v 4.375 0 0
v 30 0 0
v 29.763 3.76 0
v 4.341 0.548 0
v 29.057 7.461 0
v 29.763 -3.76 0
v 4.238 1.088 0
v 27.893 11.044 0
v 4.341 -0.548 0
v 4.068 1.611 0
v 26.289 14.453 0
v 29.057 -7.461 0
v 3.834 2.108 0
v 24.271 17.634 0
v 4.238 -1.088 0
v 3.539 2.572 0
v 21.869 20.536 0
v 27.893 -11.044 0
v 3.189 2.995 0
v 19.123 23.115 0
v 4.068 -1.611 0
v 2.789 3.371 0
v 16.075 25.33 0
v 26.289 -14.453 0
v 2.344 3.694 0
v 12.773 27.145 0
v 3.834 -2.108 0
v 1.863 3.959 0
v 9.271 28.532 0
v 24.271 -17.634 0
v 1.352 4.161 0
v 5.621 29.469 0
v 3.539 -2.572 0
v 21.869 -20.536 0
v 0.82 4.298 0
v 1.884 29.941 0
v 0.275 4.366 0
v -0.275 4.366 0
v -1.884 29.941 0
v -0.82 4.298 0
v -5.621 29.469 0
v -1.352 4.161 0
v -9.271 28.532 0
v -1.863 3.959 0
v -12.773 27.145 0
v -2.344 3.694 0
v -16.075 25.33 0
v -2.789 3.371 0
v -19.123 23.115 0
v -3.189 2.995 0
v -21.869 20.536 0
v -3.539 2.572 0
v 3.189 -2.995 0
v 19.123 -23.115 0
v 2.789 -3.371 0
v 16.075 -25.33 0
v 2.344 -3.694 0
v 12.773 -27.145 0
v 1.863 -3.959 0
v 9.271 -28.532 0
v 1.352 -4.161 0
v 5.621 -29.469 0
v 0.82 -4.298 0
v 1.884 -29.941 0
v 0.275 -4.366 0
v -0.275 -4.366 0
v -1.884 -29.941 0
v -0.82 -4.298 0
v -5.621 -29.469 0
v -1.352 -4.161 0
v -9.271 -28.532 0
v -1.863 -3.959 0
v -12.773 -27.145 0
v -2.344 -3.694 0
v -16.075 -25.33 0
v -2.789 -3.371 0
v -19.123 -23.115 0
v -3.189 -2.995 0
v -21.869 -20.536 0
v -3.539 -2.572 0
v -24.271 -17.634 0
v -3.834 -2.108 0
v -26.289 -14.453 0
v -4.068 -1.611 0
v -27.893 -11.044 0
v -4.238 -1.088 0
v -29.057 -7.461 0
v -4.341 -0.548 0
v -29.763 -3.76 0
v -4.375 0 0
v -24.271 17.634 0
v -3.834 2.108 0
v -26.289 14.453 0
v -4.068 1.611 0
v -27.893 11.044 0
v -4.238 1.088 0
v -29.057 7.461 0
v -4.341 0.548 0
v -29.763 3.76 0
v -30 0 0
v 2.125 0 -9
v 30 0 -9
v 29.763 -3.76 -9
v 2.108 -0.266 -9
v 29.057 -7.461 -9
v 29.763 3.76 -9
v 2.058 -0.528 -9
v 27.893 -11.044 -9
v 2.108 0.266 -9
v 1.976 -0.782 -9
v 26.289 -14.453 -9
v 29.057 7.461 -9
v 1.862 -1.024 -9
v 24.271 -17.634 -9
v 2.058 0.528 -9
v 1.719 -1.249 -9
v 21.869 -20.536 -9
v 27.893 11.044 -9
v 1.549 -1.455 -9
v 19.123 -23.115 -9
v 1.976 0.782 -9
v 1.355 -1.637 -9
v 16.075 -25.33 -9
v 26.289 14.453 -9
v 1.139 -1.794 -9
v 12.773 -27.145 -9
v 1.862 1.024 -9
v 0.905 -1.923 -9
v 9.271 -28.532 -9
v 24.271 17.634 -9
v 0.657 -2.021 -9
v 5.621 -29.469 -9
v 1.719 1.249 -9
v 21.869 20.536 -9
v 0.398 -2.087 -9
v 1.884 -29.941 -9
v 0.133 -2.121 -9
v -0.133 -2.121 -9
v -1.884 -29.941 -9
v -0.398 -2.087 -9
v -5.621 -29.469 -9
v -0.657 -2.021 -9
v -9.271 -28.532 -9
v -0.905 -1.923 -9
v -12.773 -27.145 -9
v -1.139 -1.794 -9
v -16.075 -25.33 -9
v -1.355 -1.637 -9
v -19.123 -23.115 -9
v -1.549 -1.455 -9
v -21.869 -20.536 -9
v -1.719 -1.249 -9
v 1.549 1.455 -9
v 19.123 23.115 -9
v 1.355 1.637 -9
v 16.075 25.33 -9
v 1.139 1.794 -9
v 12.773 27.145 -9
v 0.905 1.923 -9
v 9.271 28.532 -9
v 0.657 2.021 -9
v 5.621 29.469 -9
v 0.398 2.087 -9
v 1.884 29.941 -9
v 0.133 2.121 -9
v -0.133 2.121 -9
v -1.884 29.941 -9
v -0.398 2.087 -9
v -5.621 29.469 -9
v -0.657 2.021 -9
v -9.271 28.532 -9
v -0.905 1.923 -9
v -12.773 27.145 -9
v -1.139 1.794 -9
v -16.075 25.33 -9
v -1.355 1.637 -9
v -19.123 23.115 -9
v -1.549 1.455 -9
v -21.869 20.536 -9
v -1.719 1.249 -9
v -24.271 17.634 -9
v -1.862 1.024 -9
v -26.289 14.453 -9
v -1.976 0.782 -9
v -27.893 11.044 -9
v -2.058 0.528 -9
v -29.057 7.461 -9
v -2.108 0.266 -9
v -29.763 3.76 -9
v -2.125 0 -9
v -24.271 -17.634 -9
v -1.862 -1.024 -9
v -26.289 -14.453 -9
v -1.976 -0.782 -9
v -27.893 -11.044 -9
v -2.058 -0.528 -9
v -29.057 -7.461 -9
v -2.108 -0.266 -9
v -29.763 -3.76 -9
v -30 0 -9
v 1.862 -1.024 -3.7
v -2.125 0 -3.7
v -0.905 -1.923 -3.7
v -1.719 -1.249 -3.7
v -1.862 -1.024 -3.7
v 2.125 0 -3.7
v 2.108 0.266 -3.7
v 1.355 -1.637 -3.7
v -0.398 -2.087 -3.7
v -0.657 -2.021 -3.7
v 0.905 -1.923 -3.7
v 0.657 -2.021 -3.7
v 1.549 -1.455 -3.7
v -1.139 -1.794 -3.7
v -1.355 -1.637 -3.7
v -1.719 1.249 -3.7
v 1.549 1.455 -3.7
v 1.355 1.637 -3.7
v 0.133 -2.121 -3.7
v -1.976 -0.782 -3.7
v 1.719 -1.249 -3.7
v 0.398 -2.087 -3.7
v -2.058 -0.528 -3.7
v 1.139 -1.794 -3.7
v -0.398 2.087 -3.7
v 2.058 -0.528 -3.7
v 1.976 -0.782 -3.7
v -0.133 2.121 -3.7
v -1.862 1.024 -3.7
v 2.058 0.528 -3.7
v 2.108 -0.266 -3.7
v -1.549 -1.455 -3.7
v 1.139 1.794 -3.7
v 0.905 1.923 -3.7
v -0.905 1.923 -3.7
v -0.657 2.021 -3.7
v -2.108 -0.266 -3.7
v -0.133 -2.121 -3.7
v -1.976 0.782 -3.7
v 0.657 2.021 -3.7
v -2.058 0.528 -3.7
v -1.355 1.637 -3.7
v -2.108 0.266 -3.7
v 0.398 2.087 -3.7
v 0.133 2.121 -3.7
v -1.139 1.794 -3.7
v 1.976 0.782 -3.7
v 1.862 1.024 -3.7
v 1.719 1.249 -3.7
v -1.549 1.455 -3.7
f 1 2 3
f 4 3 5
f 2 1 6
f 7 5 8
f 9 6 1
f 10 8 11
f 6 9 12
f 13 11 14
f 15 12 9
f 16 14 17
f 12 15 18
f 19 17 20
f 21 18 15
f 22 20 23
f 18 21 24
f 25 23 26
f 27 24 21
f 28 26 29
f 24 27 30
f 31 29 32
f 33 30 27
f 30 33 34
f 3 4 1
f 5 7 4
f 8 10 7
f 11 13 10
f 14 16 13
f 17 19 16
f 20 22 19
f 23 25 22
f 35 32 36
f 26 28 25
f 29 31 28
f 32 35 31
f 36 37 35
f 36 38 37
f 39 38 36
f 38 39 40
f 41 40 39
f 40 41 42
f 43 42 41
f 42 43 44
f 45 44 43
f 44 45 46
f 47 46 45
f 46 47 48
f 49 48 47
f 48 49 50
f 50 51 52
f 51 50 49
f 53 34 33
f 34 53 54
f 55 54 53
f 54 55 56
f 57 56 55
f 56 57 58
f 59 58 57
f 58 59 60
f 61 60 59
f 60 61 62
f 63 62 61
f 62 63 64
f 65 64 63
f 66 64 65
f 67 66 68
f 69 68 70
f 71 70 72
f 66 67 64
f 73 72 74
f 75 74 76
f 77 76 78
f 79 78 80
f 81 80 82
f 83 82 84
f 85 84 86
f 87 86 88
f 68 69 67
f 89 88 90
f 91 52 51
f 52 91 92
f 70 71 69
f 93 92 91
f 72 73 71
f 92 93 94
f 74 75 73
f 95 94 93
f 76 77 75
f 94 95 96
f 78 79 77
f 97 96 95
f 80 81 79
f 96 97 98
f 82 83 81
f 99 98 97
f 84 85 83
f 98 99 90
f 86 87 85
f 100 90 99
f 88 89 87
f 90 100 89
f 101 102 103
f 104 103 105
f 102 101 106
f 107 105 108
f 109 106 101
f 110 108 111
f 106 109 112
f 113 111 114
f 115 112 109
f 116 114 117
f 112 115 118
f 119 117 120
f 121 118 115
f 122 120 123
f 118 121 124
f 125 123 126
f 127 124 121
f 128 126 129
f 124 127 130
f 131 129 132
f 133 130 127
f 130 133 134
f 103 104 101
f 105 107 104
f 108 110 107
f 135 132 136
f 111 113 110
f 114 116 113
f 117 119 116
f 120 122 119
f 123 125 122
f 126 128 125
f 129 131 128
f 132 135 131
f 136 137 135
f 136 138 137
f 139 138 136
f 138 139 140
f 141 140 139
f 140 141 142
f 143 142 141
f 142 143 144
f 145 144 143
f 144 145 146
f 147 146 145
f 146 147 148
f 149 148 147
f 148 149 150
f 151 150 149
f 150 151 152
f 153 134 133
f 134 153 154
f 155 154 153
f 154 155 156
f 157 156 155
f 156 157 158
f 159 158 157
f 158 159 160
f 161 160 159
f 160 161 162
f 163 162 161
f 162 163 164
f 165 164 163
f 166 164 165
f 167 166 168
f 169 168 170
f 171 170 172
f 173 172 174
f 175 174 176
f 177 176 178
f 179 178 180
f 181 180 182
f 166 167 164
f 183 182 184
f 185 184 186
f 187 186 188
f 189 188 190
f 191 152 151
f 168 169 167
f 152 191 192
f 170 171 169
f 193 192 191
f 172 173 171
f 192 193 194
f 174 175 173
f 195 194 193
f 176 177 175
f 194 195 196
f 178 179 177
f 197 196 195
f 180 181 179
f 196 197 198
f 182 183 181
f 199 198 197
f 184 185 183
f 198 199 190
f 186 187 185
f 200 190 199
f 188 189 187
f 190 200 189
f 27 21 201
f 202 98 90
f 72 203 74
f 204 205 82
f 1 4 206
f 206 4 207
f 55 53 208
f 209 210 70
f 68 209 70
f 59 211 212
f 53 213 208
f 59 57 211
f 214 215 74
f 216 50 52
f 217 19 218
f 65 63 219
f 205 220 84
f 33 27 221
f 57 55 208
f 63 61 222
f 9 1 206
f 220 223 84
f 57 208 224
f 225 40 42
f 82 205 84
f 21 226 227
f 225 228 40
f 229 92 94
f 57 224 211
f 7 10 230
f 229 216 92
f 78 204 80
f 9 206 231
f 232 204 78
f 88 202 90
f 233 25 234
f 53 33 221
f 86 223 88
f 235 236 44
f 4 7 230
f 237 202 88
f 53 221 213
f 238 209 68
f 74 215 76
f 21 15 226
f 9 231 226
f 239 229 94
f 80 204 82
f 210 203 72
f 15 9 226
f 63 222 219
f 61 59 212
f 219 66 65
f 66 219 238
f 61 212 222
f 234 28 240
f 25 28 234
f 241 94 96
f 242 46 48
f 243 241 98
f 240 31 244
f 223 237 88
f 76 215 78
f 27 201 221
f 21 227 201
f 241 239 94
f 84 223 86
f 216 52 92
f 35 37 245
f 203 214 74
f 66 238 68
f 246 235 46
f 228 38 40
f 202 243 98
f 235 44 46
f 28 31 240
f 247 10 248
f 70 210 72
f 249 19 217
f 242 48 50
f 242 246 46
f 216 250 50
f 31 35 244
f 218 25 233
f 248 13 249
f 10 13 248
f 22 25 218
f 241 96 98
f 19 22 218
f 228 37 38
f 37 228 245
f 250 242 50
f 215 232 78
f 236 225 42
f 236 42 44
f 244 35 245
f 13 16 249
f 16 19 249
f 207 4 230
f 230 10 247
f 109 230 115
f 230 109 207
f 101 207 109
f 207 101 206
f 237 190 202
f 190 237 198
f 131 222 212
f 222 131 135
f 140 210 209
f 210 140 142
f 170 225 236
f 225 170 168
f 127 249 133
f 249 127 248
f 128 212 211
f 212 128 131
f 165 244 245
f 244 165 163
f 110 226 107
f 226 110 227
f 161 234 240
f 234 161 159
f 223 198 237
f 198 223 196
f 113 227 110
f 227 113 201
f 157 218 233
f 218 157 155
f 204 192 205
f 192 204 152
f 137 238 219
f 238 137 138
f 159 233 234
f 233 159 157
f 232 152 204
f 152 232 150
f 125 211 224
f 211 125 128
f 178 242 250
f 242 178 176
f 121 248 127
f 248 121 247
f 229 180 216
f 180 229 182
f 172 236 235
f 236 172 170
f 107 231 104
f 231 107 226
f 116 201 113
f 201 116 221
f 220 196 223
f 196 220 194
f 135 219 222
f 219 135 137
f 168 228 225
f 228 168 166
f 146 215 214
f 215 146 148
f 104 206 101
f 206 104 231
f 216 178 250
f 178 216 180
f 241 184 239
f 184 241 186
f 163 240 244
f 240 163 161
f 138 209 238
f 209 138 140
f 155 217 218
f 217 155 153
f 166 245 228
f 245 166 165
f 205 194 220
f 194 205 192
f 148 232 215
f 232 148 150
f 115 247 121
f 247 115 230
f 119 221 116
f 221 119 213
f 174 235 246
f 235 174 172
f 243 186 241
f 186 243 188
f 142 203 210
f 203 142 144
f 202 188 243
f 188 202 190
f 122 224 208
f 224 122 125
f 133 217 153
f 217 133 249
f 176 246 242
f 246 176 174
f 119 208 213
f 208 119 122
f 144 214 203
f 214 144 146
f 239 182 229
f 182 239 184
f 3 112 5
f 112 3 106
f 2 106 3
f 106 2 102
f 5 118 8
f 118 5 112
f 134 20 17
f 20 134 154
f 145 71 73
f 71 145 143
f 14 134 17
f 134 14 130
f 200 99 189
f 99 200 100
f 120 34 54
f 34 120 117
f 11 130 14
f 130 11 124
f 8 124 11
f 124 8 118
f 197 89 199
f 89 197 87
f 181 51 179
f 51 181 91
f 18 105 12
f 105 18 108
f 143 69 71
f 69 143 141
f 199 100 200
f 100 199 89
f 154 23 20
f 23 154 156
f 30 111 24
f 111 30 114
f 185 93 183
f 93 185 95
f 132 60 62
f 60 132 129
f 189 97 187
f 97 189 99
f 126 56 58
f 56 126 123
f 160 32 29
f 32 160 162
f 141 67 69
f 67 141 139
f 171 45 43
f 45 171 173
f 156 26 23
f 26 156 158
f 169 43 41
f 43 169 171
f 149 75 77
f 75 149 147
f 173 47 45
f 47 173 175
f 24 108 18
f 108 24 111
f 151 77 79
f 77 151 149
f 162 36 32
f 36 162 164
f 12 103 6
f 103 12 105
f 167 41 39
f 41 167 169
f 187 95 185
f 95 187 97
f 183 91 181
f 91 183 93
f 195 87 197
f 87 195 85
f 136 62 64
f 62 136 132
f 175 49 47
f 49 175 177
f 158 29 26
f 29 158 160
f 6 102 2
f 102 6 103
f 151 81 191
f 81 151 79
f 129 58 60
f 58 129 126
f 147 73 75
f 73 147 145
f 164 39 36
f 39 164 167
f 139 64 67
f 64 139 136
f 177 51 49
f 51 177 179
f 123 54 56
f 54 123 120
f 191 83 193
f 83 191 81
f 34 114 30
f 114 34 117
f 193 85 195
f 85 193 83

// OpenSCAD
$fn = 50;


difference() {
	union() {
		translate(v = [0, 0, -9.0000000000]) {
			cylinder(h = 9, r = 30.0000000000);
		}
	}
	union() {
		translate(v = [0, 0, 0]) {
			rotate(a = [0, 0, 0]) {
				difference() {
					union() {
						#translate(v = [0, 0, -9.0000000000]) {
							cylinder(h = 9, r = 2.0000000000);
						}
						#translate(v = [0, 0, -3.7000000000]) {
							cylinder(h = 3.7000000000, r1 = 2.1250000000, r2 = 4.3750000000);
						}
						#translate(v = [0, 0, -9.0000000000]) {
							cylinder(h = 9, r = 2.1250000000);
						}
						#translate(v = [0, 0, -9.0000000000]) {
							cylinder(h = 9, r = 2.0000000000);
						}
					}
					union();
				}
			}
		}
	}
}
